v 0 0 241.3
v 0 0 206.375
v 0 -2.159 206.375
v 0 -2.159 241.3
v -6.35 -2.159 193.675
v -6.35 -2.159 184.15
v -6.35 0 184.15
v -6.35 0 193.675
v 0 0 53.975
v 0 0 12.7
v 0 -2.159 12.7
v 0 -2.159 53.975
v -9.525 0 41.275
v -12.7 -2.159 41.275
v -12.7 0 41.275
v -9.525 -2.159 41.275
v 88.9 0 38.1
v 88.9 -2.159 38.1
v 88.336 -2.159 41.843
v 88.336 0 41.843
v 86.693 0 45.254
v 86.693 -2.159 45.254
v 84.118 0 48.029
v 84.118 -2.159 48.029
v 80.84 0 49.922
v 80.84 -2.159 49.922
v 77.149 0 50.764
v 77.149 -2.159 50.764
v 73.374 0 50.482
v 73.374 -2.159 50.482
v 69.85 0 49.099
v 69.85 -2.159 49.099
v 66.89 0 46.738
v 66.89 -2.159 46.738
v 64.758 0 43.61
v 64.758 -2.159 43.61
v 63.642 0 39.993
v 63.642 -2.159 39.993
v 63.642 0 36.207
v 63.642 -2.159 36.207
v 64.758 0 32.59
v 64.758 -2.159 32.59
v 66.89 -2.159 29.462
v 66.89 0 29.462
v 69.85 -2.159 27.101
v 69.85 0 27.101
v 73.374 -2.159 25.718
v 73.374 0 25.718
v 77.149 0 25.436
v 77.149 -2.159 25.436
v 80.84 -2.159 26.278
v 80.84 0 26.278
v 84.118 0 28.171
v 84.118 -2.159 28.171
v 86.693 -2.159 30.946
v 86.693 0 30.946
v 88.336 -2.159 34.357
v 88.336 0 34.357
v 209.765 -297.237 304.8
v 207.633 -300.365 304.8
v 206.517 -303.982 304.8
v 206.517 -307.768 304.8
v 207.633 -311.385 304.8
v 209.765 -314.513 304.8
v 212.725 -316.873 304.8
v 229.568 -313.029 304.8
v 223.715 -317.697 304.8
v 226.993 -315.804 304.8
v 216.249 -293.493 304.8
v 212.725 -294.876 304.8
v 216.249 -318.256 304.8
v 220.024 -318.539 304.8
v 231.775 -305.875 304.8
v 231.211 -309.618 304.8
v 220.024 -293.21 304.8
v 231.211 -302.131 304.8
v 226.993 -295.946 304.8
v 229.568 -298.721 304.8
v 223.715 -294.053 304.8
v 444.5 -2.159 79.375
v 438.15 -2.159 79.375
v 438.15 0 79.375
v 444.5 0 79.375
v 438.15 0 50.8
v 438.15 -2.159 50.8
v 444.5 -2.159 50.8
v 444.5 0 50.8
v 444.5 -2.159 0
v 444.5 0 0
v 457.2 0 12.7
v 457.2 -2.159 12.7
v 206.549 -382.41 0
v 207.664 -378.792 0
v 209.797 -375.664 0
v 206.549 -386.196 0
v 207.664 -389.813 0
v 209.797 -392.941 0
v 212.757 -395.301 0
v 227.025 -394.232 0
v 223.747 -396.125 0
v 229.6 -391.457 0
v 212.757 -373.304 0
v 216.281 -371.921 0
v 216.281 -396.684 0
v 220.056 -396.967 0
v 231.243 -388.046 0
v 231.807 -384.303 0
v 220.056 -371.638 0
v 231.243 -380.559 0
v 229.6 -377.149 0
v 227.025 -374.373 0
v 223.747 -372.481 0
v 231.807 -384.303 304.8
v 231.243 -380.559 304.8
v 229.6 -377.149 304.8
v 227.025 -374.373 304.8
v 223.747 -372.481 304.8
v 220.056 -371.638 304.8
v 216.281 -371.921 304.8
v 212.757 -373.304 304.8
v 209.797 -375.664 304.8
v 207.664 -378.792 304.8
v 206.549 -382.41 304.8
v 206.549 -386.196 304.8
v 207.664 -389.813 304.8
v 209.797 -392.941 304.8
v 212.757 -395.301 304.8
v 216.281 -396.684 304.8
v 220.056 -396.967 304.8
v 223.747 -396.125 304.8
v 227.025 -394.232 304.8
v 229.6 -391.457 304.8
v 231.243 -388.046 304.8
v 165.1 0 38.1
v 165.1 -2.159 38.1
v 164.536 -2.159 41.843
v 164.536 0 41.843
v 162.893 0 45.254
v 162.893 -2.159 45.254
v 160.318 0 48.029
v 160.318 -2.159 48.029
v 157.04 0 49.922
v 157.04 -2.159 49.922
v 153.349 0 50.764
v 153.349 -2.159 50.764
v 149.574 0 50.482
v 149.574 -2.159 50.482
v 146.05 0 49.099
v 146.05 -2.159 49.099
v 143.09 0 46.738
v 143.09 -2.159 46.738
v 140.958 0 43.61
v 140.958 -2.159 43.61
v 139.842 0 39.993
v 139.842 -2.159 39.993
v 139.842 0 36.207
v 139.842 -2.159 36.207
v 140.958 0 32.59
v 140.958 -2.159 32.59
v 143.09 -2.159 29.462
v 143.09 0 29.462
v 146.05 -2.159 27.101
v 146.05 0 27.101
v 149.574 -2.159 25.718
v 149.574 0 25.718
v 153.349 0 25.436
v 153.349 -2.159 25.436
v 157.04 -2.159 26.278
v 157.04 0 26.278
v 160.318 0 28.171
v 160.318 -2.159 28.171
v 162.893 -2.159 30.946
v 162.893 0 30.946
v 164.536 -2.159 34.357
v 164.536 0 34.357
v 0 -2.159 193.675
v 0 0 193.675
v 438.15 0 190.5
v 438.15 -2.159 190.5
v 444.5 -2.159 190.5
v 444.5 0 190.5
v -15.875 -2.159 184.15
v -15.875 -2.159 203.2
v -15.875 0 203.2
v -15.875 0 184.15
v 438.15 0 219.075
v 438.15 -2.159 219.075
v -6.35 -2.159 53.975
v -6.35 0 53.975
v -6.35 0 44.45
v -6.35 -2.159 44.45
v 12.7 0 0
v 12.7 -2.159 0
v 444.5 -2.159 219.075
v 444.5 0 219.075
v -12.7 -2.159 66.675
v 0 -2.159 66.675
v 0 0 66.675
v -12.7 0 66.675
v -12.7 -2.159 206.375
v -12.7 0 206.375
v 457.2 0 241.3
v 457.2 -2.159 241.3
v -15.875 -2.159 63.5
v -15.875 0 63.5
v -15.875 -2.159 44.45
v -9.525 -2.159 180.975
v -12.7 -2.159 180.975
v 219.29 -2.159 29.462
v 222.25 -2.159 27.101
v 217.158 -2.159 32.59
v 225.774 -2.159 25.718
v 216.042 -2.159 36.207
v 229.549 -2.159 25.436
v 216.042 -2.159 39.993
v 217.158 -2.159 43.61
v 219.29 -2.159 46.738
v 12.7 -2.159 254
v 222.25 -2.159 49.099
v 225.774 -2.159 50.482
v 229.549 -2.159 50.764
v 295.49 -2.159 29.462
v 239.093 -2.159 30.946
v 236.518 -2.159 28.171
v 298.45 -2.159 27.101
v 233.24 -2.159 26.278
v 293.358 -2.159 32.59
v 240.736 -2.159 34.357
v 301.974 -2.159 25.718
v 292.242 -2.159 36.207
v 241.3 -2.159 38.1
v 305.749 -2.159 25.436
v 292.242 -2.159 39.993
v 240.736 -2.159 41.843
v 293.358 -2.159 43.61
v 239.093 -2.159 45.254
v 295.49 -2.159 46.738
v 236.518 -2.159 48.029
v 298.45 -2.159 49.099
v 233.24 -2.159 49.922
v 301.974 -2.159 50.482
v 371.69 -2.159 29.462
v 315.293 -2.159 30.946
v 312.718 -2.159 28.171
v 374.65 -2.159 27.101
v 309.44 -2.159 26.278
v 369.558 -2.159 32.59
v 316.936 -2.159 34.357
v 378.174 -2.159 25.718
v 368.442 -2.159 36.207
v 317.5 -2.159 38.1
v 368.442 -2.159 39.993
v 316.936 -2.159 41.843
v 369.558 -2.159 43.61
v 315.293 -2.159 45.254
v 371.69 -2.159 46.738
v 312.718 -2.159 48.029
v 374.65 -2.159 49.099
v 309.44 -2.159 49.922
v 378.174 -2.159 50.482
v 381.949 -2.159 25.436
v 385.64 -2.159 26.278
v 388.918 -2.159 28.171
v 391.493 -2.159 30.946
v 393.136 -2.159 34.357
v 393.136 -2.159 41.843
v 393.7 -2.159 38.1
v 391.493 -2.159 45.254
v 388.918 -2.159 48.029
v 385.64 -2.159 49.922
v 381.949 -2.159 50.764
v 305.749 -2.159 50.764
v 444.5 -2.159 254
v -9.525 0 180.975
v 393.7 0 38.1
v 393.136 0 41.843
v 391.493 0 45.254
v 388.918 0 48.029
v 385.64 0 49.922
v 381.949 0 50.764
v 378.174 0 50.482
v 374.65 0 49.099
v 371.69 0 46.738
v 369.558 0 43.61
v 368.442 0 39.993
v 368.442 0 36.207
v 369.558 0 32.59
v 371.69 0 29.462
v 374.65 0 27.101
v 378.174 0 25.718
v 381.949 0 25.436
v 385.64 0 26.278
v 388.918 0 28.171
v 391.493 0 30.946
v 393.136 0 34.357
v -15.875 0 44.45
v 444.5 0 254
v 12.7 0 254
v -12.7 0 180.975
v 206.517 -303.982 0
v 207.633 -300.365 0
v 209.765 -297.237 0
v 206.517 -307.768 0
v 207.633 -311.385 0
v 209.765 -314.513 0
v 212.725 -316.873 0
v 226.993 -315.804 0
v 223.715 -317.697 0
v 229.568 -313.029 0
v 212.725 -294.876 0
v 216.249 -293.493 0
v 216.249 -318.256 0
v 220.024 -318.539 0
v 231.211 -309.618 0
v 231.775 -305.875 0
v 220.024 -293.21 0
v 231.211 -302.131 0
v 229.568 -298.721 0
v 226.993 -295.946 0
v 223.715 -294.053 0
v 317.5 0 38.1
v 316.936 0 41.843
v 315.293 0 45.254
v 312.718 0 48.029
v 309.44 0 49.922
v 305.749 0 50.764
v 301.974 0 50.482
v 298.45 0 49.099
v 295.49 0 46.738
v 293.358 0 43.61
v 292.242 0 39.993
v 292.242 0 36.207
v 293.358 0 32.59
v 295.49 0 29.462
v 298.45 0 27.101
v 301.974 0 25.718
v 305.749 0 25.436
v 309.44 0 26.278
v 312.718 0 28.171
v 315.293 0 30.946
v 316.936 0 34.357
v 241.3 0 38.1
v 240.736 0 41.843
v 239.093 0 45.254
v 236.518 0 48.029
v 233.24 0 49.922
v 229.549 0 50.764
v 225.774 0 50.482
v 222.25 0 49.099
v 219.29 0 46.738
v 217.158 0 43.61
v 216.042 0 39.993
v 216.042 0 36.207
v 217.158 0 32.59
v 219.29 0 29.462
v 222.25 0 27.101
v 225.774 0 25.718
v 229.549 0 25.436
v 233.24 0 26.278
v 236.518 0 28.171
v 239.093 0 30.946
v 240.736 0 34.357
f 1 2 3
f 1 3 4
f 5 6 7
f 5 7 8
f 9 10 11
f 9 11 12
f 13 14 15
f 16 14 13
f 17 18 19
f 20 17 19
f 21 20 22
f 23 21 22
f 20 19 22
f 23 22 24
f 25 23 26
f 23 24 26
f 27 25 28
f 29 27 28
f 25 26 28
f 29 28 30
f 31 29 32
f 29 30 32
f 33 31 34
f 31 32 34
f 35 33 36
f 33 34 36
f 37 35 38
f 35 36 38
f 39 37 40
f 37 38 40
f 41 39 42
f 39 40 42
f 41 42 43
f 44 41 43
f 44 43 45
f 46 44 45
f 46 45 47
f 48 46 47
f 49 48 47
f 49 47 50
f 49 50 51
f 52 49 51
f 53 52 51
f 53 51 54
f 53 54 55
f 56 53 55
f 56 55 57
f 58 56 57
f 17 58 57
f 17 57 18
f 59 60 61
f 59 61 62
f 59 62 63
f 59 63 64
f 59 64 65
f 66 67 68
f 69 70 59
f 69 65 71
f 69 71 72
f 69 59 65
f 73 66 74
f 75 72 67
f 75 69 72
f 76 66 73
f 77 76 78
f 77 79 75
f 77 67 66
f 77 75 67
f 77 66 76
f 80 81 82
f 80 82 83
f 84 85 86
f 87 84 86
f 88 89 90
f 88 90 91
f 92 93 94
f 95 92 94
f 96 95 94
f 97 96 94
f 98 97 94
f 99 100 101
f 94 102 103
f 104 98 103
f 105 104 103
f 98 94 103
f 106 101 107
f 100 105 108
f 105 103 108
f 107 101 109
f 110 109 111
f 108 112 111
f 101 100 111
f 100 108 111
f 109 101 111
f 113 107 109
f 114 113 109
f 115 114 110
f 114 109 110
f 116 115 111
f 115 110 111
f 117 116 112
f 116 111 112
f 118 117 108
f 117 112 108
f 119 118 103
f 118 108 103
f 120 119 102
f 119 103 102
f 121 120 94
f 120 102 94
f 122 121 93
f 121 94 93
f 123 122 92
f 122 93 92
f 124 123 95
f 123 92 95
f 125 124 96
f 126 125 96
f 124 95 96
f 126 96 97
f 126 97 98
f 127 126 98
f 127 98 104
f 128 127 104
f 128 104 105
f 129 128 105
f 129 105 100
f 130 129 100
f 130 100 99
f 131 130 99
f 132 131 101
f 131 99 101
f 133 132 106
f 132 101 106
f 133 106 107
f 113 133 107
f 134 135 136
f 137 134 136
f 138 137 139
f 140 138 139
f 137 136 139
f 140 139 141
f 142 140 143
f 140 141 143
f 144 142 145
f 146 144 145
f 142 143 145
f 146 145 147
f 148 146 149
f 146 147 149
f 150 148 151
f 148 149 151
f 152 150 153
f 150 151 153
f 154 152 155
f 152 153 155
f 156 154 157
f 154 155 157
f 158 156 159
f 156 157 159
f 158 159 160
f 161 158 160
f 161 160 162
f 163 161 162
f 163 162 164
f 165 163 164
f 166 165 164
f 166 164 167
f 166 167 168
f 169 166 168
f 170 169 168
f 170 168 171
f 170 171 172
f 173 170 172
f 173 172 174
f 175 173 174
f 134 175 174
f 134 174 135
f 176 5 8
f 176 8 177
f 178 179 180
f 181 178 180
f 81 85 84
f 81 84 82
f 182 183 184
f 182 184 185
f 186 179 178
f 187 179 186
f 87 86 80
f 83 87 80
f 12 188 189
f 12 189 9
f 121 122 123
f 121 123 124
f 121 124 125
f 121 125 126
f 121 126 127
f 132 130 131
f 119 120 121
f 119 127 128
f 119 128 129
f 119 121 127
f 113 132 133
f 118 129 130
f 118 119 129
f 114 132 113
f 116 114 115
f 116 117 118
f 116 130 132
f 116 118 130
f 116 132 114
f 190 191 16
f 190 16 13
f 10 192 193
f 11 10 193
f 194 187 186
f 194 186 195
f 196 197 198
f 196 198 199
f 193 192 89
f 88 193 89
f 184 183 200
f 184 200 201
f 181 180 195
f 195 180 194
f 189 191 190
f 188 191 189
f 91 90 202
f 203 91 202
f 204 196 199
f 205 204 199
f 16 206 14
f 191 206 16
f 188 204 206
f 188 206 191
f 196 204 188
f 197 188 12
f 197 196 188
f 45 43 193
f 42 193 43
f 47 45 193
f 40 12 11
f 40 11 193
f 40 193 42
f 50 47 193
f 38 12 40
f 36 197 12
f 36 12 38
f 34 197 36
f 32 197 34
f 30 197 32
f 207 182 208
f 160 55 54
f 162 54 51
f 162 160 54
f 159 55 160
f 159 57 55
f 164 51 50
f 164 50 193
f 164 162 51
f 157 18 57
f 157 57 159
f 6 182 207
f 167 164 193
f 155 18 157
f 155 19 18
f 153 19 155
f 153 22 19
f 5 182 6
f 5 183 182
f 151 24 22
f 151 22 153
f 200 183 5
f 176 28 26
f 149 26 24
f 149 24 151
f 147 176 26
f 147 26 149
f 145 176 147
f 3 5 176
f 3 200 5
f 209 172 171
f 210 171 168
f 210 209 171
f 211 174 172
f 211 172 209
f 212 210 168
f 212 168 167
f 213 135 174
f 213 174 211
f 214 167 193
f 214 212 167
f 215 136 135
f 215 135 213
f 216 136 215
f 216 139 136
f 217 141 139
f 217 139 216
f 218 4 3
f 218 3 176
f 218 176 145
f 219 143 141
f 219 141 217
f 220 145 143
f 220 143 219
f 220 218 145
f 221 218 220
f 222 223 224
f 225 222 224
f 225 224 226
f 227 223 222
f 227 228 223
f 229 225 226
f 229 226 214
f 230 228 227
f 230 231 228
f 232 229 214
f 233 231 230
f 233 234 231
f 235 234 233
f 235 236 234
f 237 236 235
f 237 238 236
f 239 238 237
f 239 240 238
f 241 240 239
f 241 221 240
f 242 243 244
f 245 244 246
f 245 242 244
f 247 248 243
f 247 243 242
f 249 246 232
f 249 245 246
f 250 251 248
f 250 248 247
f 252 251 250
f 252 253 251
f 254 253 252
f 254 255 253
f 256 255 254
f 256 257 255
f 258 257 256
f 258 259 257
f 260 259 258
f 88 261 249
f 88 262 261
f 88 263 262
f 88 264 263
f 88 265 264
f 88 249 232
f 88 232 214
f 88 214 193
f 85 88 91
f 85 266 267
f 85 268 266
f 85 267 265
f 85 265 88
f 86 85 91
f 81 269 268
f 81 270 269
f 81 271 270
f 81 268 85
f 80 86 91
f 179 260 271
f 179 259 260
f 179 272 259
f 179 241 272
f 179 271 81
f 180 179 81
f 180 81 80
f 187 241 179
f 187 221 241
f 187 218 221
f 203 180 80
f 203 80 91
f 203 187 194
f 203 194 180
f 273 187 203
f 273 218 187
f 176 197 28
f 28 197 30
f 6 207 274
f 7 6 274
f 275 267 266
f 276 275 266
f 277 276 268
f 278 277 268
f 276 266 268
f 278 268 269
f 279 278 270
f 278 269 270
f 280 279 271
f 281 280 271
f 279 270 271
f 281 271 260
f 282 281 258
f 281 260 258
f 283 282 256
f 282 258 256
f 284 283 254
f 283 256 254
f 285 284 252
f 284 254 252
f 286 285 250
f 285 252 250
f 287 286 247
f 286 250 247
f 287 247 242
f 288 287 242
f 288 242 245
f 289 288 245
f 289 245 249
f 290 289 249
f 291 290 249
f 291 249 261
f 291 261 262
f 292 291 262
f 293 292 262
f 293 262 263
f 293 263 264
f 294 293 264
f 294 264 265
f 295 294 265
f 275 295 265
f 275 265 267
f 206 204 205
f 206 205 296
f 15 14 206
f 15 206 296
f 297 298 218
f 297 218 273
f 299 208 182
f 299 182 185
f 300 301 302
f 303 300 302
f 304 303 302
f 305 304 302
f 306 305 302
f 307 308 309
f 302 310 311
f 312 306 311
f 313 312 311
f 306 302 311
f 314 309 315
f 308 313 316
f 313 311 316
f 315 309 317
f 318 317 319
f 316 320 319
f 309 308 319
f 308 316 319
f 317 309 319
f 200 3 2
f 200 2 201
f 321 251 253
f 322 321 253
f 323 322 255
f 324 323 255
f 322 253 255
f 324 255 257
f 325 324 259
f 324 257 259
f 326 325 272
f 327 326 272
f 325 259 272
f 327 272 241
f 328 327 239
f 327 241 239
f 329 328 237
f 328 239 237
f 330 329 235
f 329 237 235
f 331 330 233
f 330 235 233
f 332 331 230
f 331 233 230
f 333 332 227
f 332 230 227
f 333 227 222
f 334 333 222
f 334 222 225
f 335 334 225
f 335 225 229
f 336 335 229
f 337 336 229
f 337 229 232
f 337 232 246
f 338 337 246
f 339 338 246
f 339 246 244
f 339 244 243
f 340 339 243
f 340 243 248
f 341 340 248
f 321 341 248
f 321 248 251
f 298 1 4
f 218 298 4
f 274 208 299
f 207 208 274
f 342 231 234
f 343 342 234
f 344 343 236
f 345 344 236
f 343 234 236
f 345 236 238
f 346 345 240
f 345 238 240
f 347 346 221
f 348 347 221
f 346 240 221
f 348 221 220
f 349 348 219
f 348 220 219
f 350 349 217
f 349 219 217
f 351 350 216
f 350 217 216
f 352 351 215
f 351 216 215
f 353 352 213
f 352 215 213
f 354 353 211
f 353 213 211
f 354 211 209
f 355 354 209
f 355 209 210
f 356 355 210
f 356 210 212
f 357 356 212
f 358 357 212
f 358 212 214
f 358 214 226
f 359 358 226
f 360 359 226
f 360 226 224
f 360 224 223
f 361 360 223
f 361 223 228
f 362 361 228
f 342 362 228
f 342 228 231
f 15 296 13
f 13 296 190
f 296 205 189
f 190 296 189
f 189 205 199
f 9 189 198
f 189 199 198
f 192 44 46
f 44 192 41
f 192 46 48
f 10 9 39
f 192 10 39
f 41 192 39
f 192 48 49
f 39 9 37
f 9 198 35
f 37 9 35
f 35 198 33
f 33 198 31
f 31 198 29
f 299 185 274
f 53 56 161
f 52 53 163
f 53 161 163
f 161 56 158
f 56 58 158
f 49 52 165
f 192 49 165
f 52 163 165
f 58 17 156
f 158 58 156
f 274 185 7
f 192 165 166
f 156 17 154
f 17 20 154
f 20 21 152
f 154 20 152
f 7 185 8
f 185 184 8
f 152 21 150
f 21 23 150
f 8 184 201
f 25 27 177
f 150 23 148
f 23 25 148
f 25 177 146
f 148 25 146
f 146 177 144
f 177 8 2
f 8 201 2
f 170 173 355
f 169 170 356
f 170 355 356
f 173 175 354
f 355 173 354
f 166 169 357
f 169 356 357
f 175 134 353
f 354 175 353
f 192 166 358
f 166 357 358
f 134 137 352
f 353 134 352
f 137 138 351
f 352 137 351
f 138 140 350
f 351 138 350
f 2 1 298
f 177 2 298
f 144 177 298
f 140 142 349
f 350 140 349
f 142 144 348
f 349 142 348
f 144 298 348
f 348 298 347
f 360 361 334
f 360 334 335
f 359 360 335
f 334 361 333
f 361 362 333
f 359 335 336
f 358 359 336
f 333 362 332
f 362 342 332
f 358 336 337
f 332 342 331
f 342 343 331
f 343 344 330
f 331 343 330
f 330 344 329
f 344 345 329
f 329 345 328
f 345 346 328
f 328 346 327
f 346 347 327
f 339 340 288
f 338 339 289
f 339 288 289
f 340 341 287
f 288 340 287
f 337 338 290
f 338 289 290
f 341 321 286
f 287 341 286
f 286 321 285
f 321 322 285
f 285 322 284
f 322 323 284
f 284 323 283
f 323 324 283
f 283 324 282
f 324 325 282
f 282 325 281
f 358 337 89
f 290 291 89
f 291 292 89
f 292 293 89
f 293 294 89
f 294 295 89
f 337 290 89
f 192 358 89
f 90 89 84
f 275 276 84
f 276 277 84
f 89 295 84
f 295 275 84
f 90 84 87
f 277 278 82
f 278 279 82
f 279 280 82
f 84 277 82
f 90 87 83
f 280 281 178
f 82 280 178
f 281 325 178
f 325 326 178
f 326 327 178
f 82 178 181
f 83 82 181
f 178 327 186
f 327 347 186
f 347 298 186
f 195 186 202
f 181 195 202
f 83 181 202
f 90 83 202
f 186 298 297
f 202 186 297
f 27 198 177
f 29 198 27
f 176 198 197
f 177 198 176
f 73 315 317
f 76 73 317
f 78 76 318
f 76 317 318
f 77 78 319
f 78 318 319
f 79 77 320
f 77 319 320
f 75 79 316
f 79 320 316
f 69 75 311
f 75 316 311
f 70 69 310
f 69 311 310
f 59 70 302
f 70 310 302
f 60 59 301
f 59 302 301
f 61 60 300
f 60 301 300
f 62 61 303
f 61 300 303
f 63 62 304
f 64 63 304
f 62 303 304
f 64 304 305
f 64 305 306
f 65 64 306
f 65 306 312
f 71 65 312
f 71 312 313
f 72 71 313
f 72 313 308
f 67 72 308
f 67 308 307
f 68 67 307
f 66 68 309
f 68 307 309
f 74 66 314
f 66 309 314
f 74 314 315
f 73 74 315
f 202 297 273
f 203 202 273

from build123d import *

# Parameters (mm, degrees)
F0_W      = 457.2
F0_H      = 254
F1_DEPTH  = 2.159
F3_DEPTH  = 2.159
F4_W      = 6.35
F4_H      = 28.575
F5_DEPTH  = 2.16
F6_R      = 12.7
F7_DEPTH  = 304.8
F8_R      = 12.7
F9_DEPTH  = 304.8
F10_SIZE  = 3.175
F11_SIZE  = 12.7
F12_R     = 12.7
F13_DEPTH = 2.16


with BuildPart() as f1:
    # F0 (on Front) → F1 (new body)
    with BuildSketch(Plane.XZ):
        with Locations((228.6, 127)):
            Rectangle(F0_W, F0_H)
    extrude(amount=F1_DEPTH)

    # F2 (on face) → F3 (join)
    with BuildSketch(Plane.XZ.offset(2.159)):
        Polygon((-6.35, 193.675), (0, 193.675), (0, 206.375), (-15.875, 206.375), (-15.875, 180.975), (-6.35, 180.975), align=None)
        Polygon((0, 53.975), (0, 66.675), (-15.875, 66.675), (-15.875, 41.275), (-6.35, 41.275), (-6.35, 53.975), align=None)
    extrude(amount=-F3_DEPTH)

    # F4 (on face) → F5 (cut, through all)
    with BuildSketch(Plane.XZ.offset(2.159)):
        with Locations((441.325, 204.7875)):
            Rectangle(F4_W, F4_H)
        with Locations((441.325, 65.0875)):
            Rectangle(F4_W, F4_H)
    extrude(amount=-F5_DEPTH, mode=Mode.SUBTRACT)

    # F10
    f10_edges = [f1.edges().sort_by_distance(p)[0] for p in [
        (-15.875, -1.0795, 206.375),
        (-15.875, -1.0795, 66.675),
        (-15.875, -1.0795, 41.275),
        (-6.35, -1.0795, 41.275),
        (-15.875, -1.0795, 180.975),
        (-6.35, -1.0795, 180.975),
    ]]
    chamfer(f10_edges, length=F10_SIZE)

    # F11
    f11_edges = [f1.edges().sort_by_distance(p)[0] for p in [
        (0, -1.0795, 254),
        (0, -1.0795, 0),
        (457.2, -1.0795, 0),
        (457.2, -1.0795, 254),
    ]]
    chamfer(f11_edges, length=F11_SIZE)

    # F12 (on face) → F13 (cut, through all)
    with BuildSketch(Plane.XZ.offset(2.159)):
        with Locations((76.2, 38.1)):
            Circle(F12_R)
        with Locations((152.4, 38.1)):
            Circle(F12_R)
        with Locations((228.6, 38.1)):
            Circle(F12_R)
        with Locations((304.8, 38.1)):
            Circle(F12_R)
        with Locations((381, 38.1)):
            Circle(F12_R)
    extrude(amount=-F13_DEPTH, mode=Mode.SUBTRACT)


with BuildPart() as f7:
    # F6 (on Top) → F7 (new body)
    with BuildSketch(Plane.XY):
        with Locations((219.10675, -384.302669)):
            Circle(F6_R)
    extrude(amount=F7_DEPTH)


with BuildPart() as f9:
    # F8 (on Top) → F9 (new body)
    with BuildSketch(Plane.XY):
        with Locations((219.075, -305.874876)):
            Circle(F8_R)
    extrude(amount=F9_DEPTH)


solid = Compound([f1.part, f7.part, f9.part])
